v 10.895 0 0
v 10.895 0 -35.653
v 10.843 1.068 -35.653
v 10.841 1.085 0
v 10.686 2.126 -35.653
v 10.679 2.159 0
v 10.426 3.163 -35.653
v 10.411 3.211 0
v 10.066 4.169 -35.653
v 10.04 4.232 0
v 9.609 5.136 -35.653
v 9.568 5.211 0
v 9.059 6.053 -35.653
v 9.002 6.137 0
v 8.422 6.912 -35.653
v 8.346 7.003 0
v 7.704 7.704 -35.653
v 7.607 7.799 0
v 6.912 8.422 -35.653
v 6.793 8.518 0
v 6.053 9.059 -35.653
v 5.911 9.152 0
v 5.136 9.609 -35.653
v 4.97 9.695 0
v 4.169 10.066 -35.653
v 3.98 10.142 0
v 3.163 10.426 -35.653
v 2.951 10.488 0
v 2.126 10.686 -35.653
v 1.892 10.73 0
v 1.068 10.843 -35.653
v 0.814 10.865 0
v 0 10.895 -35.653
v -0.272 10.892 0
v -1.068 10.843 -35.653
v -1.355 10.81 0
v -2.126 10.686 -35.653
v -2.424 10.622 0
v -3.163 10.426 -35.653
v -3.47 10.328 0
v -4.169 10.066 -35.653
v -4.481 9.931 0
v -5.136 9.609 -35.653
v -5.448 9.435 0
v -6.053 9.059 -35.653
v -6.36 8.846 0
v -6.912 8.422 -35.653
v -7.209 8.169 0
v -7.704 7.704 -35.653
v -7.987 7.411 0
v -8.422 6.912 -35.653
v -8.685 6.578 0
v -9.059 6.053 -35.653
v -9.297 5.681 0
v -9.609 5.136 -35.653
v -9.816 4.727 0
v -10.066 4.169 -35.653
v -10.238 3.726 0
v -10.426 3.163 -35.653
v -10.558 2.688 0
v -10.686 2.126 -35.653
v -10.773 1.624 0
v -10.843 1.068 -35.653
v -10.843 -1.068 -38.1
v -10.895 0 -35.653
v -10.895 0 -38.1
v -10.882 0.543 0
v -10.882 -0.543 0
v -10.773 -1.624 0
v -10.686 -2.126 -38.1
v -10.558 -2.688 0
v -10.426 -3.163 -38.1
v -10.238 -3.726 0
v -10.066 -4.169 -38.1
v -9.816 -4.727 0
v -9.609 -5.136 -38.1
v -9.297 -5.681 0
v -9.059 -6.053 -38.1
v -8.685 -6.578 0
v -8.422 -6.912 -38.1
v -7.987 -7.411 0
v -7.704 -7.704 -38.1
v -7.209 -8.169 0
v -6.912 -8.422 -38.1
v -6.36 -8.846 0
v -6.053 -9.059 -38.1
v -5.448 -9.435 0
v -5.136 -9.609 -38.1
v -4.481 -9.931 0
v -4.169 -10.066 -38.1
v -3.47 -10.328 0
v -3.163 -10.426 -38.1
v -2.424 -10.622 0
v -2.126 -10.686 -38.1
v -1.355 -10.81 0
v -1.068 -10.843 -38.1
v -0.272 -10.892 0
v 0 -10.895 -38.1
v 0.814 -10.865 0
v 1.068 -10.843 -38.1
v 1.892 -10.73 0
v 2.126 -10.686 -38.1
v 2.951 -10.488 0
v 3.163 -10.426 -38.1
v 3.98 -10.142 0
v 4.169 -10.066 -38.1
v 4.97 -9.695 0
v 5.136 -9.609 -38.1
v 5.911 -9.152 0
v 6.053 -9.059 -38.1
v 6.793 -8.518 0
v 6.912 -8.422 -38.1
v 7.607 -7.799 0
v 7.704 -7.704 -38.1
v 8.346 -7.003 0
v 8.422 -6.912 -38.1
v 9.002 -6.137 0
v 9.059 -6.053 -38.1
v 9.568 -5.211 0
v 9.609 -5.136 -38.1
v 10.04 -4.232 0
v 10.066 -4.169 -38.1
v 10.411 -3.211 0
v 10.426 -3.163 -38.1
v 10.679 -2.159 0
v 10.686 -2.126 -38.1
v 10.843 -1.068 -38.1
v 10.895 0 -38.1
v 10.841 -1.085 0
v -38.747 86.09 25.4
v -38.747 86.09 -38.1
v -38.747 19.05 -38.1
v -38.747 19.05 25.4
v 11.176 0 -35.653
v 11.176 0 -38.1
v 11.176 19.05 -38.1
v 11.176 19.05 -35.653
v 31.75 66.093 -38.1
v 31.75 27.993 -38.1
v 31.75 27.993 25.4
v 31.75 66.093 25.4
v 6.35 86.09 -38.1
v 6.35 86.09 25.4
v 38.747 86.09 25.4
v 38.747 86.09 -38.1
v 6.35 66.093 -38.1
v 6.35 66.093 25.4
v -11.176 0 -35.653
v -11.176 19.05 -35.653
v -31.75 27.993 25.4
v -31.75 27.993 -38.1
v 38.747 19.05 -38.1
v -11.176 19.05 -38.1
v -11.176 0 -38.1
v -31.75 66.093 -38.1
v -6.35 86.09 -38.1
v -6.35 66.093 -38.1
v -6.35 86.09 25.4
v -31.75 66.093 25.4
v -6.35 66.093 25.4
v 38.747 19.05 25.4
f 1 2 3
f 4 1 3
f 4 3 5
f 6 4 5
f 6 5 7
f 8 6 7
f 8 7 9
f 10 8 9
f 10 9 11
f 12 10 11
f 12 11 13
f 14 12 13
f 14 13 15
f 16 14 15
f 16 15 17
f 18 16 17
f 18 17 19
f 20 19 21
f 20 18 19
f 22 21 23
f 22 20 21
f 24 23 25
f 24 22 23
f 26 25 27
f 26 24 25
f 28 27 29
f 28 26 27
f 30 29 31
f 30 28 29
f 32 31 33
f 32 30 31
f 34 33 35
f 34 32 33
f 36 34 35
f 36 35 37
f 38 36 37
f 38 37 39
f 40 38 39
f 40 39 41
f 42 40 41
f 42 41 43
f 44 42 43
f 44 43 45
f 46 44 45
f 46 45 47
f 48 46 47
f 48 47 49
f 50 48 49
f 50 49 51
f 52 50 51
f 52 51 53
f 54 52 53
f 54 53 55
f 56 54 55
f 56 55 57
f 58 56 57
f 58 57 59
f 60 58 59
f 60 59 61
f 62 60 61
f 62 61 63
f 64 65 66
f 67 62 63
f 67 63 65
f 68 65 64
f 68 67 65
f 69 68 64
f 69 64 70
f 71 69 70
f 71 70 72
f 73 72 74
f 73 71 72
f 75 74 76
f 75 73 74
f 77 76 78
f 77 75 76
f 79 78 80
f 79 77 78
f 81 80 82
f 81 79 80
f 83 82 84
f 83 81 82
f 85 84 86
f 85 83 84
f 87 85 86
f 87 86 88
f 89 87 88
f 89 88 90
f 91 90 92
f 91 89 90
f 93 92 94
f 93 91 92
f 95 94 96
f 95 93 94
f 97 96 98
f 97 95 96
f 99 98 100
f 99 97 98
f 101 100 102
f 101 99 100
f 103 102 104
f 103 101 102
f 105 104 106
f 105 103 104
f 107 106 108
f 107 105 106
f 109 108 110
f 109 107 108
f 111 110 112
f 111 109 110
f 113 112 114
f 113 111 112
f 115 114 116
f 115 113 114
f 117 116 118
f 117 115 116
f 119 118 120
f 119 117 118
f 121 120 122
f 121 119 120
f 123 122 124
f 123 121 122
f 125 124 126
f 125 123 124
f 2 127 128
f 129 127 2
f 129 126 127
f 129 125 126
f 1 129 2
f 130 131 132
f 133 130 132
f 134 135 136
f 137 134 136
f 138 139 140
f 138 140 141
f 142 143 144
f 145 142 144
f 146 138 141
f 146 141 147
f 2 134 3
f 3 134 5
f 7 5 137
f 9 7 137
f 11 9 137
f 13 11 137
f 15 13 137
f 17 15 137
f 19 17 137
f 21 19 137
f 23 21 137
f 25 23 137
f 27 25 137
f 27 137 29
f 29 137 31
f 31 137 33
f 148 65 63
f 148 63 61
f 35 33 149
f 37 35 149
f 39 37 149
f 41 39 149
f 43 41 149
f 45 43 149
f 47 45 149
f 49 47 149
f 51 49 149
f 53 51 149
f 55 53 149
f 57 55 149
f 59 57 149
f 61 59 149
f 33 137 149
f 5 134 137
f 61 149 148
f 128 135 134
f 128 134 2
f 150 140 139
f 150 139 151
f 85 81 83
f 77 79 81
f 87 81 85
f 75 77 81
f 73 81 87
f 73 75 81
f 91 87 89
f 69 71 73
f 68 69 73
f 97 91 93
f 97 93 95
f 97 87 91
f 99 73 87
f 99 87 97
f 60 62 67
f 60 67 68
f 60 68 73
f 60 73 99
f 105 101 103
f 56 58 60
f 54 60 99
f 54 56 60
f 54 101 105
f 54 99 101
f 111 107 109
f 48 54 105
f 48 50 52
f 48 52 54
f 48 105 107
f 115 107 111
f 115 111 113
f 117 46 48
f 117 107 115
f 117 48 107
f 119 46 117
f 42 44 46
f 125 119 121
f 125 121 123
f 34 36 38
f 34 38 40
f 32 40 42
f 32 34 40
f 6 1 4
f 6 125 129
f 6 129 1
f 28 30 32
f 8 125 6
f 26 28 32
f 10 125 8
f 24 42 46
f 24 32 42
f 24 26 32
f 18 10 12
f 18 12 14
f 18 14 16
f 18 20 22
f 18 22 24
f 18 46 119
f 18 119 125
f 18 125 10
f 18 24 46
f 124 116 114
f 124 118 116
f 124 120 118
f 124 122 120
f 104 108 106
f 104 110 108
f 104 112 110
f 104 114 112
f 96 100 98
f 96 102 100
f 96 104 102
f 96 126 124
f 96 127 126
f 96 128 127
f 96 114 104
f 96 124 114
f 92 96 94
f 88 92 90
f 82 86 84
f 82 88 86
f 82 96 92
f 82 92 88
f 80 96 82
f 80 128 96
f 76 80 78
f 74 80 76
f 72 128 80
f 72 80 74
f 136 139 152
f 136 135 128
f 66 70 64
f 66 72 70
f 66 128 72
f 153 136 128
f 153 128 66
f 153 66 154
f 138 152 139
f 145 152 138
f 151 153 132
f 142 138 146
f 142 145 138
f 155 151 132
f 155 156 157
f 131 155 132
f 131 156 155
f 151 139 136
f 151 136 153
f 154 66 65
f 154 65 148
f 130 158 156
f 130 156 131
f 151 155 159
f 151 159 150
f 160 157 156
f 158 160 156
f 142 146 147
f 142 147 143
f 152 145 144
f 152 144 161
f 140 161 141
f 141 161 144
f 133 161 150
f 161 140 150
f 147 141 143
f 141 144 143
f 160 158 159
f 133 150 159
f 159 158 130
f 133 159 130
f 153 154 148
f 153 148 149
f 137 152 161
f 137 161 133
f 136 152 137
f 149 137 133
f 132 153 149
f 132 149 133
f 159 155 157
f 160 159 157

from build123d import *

# Parameters (mm, degrees)
SKETCH1_R           = 10.89504564
BOSS_EXTRUDE1_DEPTH = 38.1
SKETCH2_W           = 22.352
SKETCH2_H           = 19.05
BOSS_EXTRUDE2_DEPTH = 2.44693827
SKETCH3_W           = 63.5
SKETCH3_H           = 8.943070636
BOSS_EXTRUDE3_DEPTH = 63.5
BOSS_EXTRUDE4_DEPTH = 63.5


with BuildPart() as part:
    # Sketch1 → Boss-Extrude1 (new body)
    with BuildSketch(Plane.XY):
        Circle(SKETCH1_R)
    extrude(amount=-BOSS_EXTRUDE1_DEPTH)

    # Sketch2 → Boss-Extrude2 (add)
    with BuildSketch(Plane(origin=(0, 0, -38.1), x_dir=(-1, 0, 0), z_dir=(0, 0, -1))):
        with Locations((0, 9.525)):
            Rectangle(SKETCH2_W, SKETCH2_H)
    extrude(amount=-BOSS_EXTRUDE2_DEPTH)

    # Sketch3 → Boss-Extrude3 (add)
    with BuildSketch(Plane(origin=(0, 0, -38.1), x_dir=(-1, 0, 0), z_dir=(0, 0, -1))):
        with Locations((0, 23.521535318)):
            Rectangle(SKETCH3_W, SKETCH3_H)
    extrude(amount=-BOSS_EXTRUDE3_DEPTH)

    # Sketch4 → Boss-Extrude4 (add)
    with BuildSketch(Plane(origin=(0, 0, -38.1), x_dir=(-1, 0, 0), z_dir=(0, 0, -1))):
        Polygon((-31.75, 27.993070636), (-31.75, 66.093070636), (-6.35, 66.093070636), (-6.35, 86.090384505), (-38.747245179, 86.090384505), (-38.747245179, 19.05), (-31.75, 19.05), align=None)
        Polygon((31.75, 27.993070636), (31.75, 66.093070636), (6.35, 66.093070636), (6.35, 86.090384505), (38.747245179, 86.090384505), (38.747245179, 19.05), (31.75, 19.05), align=None)
    extrude(amount=-BOSS_EXTRUDE4_DEPTH)


solid = part.part
